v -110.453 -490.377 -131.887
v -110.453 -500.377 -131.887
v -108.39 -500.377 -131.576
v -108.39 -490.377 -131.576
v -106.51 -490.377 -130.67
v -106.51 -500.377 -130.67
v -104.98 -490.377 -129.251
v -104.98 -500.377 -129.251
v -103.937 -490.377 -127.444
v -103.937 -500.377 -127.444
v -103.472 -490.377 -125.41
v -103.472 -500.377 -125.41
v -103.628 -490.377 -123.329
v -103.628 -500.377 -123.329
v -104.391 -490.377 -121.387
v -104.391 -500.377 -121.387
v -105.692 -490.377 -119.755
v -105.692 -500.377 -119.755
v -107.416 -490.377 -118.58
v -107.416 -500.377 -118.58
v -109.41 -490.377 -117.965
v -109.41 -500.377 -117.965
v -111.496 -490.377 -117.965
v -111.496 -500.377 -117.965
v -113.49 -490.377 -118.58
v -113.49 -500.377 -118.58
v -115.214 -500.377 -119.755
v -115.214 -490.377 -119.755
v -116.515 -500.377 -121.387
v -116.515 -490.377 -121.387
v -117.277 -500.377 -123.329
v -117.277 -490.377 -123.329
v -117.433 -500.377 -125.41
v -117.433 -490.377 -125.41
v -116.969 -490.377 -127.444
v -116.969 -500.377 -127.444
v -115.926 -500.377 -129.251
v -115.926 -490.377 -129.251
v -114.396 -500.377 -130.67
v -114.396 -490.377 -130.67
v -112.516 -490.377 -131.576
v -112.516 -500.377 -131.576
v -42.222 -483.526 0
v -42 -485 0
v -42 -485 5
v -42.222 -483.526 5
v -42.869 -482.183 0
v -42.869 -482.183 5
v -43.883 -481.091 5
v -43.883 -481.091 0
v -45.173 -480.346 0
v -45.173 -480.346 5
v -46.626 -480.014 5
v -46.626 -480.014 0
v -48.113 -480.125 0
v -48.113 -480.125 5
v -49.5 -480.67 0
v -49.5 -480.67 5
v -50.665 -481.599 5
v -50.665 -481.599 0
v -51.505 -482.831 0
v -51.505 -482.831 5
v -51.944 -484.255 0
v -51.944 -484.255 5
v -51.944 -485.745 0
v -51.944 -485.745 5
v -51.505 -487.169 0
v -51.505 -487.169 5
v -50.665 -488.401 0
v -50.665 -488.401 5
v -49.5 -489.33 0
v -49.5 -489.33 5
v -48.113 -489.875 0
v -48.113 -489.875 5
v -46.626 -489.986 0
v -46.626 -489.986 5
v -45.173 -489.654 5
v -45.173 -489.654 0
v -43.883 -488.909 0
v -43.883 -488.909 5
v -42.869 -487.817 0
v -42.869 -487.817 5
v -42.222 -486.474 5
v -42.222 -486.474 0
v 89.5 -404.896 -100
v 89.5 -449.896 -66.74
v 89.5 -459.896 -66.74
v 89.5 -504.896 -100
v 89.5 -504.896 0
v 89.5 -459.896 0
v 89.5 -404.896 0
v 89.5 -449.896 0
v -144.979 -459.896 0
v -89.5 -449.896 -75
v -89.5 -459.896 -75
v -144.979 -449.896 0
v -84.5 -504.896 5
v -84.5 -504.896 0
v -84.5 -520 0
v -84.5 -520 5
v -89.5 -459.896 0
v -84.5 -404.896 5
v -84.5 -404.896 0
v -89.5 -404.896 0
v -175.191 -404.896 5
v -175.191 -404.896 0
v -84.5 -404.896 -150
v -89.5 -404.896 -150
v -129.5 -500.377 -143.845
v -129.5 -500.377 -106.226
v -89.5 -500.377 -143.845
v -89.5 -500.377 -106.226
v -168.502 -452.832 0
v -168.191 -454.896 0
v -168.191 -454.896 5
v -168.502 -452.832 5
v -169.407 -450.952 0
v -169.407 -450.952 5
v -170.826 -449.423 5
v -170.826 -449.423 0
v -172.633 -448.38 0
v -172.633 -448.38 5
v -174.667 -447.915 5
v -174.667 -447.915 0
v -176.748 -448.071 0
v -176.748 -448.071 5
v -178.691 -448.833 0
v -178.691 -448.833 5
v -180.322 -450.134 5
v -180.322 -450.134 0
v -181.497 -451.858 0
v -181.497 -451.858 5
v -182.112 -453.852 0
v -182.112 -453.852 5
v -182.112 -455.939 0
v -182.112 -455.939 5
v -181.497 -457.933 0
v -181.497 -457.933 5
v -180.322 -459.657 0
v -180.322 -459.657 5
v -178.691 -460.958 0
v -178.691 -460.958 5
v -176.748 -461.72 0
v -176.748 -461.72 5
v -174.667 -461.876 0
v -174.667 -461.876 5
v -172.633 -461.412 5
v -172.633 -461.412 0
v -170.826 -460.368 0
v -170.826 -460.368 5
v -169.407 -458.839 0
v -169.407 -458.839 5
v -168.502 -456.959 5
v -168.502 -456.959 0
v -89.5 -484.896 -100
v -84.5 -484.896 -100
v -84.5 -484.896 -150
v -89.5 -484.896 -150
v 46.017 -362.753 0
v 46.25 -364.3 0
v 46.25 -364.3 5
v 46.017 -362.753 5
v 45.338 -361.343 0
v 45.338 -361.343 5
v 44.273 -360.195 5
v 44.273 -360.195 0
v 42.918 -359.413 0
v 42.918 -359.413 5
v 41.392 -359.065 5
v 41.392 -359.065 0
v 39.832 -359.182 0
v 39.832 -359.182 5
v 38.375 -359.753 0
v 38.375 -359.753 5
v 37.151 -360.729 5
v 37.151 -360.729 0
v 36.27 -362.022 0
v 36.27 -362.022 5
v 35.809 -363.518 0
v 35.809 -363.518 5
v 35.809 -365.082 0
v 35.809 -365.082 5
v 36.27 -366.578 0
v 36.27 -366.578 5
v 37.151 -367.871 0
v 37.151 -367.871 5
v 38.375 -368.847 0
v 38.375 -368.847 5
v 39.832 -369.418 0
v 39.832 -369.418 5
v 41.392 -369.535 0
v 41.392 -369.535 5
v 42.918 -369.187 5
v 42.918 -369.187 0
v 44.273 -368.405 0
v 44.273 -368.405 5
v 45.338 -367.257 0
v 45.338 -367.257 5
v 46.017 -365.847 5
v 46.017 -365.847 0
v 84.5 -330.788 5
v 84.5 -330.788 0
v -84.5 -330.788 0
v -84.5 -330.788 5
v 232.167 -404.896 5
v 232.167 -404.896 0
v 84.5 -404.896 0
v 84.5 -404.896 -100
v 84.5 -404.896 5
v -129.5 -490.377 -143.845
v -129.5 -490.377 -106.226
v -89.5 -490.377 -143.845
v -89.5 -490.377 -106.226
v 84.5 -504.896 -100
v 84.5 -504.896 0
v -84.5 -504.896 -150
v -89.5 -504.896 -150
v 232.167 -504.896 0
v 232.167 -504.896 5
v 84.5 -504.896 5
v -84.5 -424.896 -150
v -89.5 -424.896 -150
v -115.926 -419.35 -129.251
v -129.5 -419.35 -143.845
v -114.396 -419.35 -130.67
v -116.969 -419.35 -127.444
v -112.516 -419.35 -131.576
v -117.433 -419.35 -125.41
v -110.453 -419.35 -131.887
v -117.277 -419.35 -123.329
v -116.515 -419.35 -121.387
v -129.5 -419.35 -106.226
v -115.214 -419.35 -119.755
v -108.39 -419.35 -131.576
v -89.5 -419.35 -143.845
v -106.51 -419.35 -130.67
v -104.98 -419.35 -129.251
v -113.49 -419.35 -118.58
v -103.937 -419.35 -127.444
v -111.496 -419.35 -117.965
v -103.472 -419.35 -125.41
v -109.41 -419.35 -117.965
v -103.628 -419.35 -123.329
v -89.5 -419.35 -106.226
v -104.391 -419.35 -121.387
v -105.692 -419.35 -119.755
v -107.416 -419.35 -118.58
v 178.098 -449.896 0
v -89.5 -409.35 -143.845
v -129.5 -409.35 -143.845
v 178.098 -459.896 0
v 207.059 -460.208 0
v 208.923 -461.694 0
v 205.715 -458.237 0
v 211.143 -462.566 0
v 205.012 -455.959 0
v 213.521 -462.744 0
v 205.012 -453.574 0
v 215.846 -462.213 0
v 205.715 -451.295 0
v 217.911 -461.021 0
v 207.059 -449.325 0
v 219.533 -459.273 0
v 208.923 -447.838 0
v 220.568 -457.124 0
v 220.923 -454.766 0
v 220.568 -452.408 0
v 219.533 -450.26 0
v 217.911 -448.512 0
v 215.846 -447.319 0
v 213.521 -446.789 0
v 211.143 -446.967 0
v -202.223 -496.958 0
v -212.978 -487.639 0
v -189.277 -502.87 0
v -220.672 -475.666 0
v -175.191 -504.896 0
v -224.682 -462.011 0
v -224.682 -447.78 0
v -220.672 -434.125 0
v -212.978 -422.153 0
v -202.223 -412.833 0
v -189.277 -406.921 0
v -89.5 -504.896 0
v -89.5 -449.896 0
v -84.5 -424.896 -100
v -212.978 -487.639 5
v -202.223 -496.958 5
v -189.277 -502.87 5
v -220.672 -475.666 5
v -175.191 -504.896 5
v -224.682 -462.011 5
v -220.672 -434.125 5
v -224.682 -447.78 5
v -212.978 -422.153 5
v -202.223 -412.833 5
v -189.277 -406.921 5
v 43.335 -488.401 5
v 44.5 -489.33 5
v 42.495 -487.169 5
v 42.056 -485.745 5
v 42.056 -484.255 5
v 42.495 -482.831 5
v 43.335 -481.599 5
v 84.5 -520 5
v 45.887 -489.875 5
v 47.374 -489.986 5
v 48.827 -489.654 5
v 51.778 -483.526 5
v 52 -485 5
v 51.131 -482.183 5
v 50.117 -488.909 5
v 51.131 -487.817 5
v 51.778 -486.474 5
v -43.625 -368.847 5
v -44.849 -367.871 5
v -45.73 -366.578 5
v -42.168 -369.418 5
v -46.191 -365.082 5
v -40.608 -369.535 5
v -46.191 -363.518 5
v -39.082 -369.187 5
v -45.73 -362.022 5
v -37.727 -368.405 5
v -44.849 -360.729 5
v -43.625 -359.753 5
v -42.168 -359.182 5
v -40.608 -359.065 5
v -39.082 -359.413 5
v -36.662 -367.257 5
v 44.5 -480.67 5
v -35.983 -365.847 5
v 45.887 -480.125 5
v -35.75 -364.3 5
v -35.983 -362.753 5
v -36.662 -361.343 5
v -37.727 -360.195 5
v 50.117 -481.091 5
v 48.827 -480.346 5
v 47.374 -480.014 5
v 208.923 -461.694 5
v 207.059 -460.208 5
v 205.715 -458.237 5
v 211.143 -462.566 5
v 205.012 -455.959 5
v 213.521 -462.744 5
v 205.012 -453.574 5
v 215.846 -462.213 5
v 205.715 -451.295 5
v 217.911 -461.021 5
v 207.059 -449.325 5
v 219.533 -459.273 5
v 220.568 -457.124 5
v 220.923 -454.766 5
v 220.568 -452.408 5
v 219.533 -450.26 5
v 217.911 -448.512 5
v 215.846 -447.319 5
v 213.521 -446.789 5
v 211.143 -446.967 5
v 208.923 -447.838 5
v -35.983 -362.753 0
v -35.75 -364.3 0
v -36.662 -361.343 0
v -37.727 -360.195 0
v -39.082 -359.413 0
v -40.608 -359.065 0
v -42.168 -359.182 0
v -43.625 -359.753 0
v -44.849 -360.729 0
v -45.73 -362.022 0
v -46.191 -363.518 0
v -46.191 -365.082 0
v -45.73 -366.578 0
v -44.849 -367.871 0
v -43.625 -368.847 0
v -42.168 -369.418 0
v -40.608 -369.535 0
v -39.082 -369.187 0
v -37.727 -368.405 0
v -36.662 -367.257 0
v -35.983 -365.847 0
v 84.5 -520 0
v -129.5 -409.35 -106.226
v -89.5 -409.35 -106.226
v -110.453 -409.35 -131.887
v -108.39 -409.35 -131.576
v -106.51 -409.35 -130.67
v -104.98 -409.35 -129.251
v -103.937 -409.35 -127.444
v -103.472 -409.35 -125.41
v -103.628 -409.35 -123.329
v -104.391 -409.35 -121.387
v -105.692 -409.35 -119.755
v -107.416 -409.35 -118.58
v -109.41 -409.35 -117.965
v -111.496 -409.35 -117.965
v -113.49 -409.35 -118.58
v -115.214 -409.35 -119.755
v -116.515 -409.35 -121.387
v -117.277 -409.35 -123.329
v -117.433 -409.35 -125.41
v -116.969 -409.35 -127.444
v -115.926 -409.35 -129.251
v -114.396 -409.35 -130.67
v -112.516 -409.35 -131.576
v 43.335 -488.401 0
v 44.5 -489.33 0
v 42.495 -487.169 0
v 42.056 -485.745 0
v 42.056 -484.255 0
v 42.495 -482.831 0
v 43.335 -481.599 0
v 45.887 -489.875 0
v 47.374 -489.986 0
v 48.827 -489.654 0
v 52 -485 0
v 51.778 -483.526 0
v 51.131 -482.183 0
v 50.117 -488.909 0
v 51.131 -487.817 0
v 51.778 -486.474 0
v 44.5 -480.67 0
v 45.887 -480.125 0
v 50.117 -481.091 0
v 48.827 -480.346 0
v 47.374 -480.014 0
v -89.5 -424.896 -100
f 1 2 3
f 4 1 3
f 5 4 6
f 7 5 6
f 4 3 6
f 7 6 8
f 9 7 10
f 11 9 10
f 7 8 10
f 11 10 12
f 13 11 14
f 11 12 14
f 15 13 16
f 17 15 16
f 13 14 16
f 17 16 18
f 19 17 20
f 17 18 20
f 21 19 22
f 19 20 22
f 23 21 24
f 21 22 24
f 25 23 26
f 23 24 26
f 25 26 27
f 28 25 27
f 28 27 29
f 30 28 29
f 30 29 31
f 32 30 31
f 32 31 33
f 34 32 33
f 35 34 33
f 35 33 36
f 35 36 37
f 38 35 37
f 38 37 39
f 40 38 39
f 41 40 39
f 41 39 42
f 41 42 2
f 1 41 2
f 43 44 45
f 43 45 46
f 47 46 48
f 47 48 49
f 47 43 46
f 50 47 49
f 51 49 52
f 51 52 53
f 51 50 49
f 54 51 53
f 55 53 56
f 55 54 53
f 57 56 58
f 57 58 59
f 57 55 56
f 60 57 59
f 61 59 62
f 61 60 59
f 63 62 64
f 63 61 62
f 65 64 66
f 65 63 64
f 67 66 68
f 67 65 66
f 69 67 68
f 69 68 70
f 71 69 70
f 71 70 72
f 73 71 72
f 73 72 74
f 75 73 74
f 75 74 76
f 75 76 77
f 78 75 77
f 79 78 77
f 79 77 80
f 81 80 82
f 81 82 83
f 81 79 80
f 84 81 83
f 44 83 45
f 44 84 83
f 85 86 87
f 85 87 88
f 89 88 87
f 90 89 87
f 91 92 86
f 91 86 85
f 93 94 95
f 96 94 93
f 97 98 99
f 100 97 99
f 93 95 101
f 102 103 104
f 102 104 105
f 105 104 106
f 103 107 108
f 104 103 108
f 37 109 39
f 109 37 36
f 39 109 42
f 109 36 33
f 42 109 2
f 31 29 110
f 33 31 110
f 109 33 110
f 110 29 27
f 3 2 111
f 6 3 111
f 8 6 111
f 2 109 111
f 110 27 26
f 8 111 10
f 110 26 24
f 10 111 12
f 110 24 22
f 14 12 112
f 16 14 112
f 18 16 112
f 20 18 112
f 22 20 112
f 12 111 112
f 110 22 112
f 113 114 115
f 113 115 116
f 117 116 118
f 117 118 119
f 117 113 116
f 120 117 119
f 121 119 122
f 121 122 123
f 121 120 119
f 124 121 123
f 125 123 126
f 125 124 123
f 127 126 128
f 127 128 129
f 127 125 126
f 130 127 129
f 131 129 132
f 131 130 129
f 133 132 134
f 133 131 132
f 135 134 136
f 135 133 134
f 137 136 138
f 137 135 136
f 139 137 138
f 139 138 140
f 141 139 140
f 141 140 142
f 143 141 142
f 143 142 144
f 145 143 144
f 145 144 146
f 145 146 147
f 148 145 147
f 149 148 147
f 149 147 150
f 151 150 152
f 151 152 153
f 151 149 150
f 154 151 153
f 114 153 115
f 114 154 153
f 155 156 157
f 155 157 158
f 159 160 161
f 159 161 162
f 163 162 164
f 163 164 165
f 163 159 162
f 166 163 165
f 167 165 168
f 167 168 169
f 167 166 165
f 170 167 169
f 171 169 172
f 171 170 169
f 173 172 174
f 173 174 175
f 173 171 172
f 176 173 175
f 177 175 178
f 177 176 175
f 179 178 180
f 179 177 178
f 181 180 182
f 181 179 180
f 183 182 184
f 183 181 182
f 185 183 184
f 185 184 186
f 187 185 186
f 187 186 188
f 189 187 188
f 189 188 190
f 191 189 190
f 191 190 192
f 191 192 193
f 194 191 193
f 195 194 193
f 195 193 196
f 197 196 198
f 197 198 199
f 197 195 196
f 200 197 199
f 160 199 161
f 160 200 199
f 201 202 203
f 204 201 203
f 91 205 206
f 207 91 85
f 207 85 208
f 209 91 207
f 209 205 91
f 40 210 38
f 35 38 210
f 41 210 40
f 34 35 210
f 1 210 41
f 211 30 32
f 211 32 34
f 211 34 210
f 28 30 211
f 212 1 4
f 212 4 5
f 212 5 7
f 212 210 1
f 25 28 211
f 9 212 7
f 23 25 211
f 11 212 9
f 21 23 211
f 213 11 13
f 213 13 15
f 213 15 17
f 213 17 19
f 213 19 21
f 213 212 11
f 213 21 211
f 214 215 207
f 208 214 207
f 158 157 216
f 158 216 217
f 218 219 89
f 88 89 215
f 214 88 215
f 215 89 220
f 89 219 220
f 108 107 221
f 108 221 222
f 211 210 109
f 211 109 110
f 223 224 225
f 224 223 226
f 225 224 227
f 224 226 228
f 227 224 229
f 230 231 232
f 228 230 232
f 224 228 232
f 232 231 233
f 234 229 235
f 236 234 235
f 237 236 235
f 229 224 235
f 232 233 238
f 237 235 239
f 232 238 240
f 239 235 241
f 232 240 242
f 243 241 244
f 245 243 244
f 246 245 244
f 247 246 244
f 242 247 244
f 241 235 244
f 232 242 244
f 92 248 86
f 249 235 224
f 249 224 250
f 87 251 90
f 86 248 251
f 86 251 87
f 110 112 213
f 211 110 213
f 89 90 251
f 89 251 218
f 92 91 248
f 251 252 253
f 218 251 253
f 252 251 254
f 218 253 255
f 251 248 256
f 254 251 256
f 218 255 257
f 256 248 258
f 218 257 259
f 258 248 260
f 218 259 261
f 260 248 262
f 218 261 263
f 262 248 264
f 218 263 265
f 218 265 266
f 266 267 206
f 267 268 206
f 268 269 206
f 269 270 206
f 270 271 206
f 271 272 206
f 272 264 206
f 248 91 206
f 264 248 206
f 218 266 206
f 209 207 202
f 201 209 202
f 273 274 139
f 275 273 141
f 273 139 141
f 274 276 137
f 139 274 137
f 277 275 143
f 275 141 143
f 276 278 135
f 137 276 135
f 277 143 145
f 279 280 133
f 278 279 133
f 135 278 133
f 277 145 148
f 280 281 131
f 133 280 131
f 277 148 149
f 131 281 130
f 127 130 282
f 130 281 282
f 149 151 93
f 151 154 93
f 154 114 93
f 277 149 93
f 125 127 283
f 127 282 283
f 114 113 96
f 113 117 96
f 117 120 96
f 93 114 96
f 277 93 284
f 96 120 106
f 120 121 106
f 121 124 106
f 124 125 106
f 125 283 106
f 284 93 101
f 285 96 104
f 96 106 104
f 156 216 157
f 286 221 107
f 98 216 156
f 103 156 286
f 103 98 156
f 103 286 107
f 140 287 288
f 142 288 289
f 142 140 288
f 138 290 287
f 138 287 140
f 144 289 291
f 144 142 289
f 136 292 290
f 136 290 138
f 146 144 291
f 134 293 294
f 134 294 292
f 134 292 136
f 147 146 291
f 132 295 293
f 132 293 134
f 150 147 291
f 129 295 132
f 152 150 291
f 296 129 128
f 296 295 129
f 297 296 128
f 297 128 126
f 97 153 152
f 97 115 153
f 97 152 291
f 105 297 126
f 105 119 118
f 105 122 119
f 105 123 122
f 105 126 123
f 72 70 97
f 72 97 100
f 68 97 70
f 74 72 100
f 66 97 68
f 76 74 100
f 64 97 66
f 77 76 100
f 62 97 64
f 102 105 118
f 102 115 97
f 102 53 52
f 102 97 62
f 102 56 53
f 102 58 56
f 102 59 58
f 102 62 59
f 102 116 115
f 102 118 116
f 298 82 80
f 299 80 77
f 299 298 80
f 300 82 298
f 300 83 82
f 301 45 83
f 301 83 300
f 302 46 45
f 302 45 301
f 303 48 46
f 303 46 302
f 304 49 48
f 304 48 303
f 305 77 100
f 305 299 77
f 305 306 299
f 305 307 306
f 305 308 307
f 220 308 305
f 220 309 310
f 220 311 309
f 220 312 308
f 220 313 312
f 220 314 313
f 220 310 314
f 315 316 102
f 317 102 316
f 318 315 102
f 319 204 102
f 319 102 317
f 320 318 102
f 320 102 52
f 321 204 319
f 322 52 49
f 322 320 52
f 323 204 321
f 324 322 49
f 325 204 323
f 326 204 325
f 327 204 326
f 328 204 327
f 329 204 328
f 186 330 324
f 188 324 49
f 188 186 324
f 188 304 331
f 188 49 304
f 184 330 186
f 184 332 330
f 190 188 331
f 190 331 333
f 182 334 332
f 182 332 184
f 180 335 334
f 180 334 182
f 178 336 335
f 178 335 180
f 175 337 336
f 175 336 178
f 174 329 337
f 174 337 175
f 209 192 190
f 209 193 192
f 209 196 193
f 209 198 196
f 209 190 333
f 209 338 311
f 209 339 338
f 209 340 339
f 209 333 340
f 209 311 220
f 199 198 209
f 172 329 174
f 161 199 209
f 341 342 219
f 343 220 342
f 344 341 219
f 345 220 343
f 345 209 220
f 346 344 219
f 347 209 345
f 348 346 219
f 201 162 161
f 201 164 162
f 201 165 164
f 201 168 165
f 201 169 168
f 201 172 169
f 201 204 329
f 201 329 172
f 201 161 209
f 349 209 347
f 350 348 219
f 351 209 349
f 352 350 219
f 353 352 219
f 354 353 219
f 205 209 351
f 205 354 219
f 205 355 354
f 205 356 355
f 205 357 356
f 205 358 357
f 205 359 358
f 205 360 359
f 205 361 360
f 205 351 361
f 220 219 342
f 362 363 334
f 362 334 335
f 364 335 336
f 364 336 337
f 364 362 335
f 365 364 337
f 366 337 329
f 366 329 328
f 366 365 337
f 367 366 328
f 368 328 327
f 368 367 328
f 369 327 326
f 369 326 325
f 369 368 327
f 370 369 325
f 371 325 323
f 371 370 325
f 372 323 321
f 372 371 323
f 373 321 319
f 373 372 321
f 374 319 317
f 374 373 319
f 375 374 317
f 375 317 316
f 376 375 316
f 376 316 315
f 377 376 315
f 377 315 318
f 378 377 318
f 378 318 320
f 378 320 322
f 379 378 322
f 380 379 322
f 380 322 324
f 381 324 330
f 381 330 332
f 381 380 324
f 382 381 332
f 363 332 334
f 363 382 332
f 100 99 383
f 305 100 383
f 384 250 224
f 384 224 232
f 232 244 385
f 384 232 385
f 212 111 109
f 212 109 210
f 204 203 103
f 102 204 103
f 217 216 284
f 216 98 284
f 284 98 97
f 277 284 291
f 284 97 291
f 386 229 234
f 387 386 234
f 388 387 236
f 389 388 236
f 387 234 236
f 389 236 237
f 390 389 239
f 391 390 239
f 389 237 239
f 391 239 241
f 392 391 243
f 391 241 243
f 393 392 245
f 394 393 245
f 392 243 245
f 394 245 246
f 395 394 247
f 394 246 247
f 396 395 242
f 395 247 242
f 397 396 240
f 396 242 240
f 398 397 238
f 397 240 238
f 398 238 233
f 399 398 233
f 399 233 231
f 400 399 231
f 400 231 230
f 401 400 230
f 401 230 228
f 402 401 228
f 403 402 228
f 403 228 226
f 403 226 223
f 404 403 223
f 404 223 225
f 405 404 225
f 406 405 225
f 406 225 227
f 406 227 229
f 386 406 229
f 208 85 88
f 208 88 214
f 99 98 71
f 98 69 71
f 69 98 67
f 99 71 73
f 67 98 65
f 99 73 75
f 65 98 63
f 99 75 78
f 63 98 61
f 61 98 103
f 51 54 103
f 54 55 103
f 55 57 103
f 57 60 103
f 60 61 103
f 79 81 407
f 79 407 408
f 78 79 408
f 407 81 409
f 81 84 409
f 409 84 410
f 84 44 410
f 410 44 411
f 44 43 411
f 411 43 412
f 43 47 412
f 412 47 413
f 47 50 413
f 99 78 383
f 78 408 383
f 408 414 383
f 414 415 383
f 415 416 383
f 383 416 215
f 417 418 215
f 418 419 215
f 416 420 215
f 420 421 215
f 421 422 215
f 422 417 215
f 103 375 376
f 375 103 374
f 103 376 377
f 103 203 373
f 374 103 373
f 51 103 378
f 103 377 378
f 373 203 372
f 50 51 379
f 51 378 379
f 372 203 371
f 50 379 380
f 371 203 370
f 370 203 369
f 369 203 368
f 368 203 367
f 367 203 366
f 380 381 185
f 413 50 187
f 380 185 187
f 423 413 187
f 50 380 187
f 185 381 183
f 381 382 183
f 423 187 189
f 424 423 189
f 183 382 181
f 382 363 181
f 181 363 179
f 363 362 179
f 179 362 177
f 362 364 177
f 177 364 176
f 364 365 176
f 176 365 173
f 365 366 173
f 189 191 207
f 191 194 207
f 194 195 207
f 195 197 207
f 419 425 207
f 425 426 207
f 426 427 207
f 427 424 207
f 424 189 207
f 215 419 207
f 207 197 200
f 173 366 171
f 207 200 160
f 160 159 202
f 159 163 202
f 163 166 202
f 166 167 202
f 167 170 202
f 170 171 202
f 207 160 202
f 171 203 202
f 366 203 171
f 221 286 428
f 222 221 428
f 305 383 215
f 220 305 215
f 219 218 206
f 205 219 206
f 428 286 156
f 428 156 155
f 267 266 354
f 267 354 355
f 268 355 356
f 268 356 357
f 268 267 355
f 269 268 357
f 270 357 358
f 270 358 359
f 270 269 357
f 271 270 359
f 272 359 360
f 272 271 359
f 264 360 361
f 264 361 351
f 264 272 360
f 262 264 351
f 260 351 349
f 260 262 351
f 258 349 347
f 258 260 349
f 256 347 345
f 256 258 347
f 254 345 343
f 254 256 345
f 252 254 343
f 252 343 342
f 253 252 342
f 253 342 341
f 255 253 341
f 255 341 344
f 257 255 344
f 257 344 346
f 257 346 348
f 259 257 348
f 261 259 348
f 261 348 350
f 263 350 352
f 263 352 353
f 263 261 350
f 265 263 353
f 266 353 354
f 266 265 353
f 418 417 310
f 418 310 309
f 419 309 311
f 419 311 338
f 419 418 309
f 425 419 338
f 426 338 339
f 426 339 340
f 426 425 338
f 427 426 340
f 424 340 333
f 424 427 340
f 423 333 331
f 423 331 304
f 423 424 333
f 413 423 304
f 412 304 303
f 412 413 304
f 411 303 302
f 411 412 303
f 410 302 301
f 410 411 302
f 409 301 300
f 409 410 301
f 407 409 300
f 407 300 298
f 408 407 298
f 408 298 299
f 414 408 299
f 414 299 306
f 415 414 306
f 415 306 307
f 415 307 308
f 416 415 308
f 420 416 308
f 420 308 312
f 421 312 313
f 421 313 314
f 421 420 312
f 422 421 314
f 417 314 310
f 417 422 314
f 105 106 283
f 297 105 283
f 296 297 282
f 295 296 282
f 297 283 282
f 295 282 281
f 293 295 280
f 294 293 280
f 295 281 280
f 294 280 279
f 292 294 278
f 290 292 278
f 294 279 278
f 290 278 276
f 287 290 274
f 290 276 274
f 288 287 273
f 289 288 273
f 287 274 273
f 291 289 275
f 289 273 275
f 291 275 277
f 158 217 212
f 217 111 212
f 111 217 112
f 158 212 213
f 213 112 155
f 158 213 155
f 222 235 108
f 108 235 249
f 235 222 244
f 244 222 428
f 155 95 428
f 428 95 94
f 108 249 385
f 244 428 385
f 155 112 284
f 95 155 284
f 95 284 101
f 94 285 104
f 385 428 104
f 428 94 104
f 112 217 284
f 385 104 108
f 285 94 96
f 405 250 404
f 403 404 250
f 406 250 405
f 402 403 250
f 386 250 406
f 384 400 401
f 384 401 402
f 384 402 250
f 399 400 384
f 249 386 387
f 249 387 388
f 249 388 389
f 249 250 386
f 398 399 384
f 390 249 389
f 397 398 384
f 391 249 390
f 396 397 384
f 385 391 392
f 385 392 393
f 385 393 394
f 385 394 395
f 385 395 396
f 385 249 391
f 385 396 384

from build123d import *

# Parameters (mm, degrees)
CROQUIS1_R              = 7
CROQUIS1_R_2            = 5.25
CROQUIS1_R_3            = 5
CROQUIS1_R_4            = 8
SALIENTE_EXTRUIR1_DEPTH = 5
CROQUIS2_W              = 5
CROQUIS2_H              = 100
SALIENTE_EXTRUIR2_DEPTH = 100
CROQUIS3_W              = 5
CROQUIS3_H              = 20
SALIENTE_EXTRUIR3_DEPTH = 50
CROQUIS4_W              = 37.618444679
CROQUIS4_H              = 10
SALIENTE_EXTRUIR4_DEPTH = 40
CROQUIS5_R              = 7
CORTAR_EXTRUIR1_DEPTH   = 325.287034049
NERVIO1_REACH           = 304.992
CROQUIS6_WALL_W         = 701.273547134
CROQUIS6_WALL_H         = 10
NERVIO2_REACH           = 304.992
CROQUIS7_WALL_W         = 718.906485388
CROQUIS7_WALL_H         = 10


with BuildPart() as part:
    # Croquis1 → Saliente-Extruir1 (new body)
    with BuildSketch(Plane.XY):
        with BuildLine():
            Line((232.166801748, -404.895674081), (84.5, -404.895674081))
            Line((84.5, -404.895674081), (84.5, -330.787715528))
            Line((84.5, -330.787715528), (-84.5, -330.787715528))
            Line((-84.5, -330.787715528), (-84.5, -404.895674081))
            Line((-84.5, -404.895674081), (-175.19051762, -404.895674081))
            ThreePointArc((-175.19051762, -404.895674081), (-225.19051762, -454.895674081), (-175.19051762, -504.895674081))
            Line((-175.19051762, -504.895674081), (-84.5, -504.895674081))
            Line((-84.5, -504.895674081), (-84.5, -520))
            Line((-84.5, -520), (84.5, -520))
            Line((84.5, -520), (84.5, -504.895674081))
            Line((84.5, -504.895674081), (232.166801748, -504.895674081))
            Line((232.166801748, -504.895674081), (232.166801748, -404.895674081))
        make_face()
        with Locations((-175.19051762, -454.895674081)):
            Circle(CROQUIS1_R, mode=Mode.SUBTRACT)
        with Locations((41, -364.3)):
            Circle(CROQUIS1_R_2, mode=Mode.SUBTRACT)
        with Locations((-41, -364.3)):
            Circle(CROQUIS1_R_2, mode=Mode.SUBTRACT)
        with Locations((47, -485)):
            Circle(CROQUIS1_R_3, mode=Mode.SUBTRACT)
        with Locations((-47, -485)):
            Circle(CROQUIS1_R_3, mode=Mode.SUBTRACT)
        with Locations((212.922919346, -454.766206892)):
            Circle(CROQUIS1_R_4, mode=Mode.SUBTRACT)
    extrude(amount=SALIENTE_EXTRUIR1_DEPTH)

    # Croquis2 → Saliente-Extruir2 (add)
    with BuildSketch(Plane(origin=(0, 0, 0), x_dir=(-1, 0, 0), z_dir=(0, 0, -1))):
        with Locations((-87, -454.895674081)):
            Rectangle(CROQUIS2_W, CROQUIS2_H)
        with Locations((87, -454.895674081)):
            Rectangle(CROQUIS2_W, CROQUIS2_H)
    extrude(amount=SALIENTE_EXTRUIR2_DEPTH)

    # Croquis3 → Saliente-Extruir3 (add)
    with BuildSketch(Plane(origin=(0, 0, -100), x_dir=(-1, 0, 0), z_dir=(0, 0, -1))):
        with Locations((87, -494.895674081)):
            Rectangle(CROQUIS3_W, CROQUIS3_H)
        with Locations((87, -414.895674081)):
            Rectangle(CROQUIS3_W, CROQUIS3_H)
    extrude(amount=SALIENTE_EXTRUIR3_DEPTH)

    # Croquis4 → Saliente-Extruir4 (add)
    with BuildSketch(Plane.ZY.offset(89.5)):
        with Locations((-125.035404741, -414.350039231)):
            Rectangle(CROQUIS4_W, CROQUIS4_H)
        with Locations((-125.035404741, -495.377386848)):
            Rectangle(CROQUIS4_W, CROQUIS4_H)
    extrude(amount=SALIENTE_EXTRUIR4_DEPTH)

    # Croquis5 → Cortar-Extruir1 (cut, through all)
    with BuildSketch(Plane.XZ.offset(500.377386848)):
        with Locations(Location((-110.45279813, -124.886599464, 0), (0, 0, 270))):
            Circle(CROQUIS5_R)
    extrude(amount=-CORTAR_EXTRUIR1_DEPTH, mode=Mode.SUBTRACT)

    # Croquis6 wall → Nervio1 (add, up to next)
    with BuildSketch(Plane(origin=(-117.239432288, -454.895674081, -37.5), x_dir=(-0.594696602605, 0, 0.803950216649), z_dir=(-0.803950216649, 0, -0.594696602605)), mode=Mode.PRIVATE) as nervio1_sk1:
        Rectangle(CROQUIS6_WALL_W, CROQUIS6_WALL_H)
    nervio1_tool1 = extrude(nervio1_sk1.sketch, amount=-NERVIO1_REACH, mode=Mode.PRIVATE) - part.part
    add(nervio1_tool1.solids().sort_by_distance((-117.239432288, -454.895674081, -37.5))[0])

    # Croquis7 wall → Nervio2 (add, up to next)
    with BuildSketch(Plane(origin=(133.798766553, -454.895674081, -33.37002042), x_dir=(-0.79873511165, 0, -0.601682824599), z_dir=(0.601682824599, 0, -0.79873511165)), mode=Mode.PRIVATE) as nervio2_sk1:
        Rectangle(CROQUIS7_WALL_W, CROQUIS7_WALL_H)
    nervio2_tool1 = extrude(nervio2_sk1.sketch, amount=-NERVIO2_REACH, mode=Mode.PRIVATE) - part.part
    add(nervio2_tool1.solids().sort_by_distance((133.798766553, -454.895674081, -33.37002042))[0])


solid = part.part
